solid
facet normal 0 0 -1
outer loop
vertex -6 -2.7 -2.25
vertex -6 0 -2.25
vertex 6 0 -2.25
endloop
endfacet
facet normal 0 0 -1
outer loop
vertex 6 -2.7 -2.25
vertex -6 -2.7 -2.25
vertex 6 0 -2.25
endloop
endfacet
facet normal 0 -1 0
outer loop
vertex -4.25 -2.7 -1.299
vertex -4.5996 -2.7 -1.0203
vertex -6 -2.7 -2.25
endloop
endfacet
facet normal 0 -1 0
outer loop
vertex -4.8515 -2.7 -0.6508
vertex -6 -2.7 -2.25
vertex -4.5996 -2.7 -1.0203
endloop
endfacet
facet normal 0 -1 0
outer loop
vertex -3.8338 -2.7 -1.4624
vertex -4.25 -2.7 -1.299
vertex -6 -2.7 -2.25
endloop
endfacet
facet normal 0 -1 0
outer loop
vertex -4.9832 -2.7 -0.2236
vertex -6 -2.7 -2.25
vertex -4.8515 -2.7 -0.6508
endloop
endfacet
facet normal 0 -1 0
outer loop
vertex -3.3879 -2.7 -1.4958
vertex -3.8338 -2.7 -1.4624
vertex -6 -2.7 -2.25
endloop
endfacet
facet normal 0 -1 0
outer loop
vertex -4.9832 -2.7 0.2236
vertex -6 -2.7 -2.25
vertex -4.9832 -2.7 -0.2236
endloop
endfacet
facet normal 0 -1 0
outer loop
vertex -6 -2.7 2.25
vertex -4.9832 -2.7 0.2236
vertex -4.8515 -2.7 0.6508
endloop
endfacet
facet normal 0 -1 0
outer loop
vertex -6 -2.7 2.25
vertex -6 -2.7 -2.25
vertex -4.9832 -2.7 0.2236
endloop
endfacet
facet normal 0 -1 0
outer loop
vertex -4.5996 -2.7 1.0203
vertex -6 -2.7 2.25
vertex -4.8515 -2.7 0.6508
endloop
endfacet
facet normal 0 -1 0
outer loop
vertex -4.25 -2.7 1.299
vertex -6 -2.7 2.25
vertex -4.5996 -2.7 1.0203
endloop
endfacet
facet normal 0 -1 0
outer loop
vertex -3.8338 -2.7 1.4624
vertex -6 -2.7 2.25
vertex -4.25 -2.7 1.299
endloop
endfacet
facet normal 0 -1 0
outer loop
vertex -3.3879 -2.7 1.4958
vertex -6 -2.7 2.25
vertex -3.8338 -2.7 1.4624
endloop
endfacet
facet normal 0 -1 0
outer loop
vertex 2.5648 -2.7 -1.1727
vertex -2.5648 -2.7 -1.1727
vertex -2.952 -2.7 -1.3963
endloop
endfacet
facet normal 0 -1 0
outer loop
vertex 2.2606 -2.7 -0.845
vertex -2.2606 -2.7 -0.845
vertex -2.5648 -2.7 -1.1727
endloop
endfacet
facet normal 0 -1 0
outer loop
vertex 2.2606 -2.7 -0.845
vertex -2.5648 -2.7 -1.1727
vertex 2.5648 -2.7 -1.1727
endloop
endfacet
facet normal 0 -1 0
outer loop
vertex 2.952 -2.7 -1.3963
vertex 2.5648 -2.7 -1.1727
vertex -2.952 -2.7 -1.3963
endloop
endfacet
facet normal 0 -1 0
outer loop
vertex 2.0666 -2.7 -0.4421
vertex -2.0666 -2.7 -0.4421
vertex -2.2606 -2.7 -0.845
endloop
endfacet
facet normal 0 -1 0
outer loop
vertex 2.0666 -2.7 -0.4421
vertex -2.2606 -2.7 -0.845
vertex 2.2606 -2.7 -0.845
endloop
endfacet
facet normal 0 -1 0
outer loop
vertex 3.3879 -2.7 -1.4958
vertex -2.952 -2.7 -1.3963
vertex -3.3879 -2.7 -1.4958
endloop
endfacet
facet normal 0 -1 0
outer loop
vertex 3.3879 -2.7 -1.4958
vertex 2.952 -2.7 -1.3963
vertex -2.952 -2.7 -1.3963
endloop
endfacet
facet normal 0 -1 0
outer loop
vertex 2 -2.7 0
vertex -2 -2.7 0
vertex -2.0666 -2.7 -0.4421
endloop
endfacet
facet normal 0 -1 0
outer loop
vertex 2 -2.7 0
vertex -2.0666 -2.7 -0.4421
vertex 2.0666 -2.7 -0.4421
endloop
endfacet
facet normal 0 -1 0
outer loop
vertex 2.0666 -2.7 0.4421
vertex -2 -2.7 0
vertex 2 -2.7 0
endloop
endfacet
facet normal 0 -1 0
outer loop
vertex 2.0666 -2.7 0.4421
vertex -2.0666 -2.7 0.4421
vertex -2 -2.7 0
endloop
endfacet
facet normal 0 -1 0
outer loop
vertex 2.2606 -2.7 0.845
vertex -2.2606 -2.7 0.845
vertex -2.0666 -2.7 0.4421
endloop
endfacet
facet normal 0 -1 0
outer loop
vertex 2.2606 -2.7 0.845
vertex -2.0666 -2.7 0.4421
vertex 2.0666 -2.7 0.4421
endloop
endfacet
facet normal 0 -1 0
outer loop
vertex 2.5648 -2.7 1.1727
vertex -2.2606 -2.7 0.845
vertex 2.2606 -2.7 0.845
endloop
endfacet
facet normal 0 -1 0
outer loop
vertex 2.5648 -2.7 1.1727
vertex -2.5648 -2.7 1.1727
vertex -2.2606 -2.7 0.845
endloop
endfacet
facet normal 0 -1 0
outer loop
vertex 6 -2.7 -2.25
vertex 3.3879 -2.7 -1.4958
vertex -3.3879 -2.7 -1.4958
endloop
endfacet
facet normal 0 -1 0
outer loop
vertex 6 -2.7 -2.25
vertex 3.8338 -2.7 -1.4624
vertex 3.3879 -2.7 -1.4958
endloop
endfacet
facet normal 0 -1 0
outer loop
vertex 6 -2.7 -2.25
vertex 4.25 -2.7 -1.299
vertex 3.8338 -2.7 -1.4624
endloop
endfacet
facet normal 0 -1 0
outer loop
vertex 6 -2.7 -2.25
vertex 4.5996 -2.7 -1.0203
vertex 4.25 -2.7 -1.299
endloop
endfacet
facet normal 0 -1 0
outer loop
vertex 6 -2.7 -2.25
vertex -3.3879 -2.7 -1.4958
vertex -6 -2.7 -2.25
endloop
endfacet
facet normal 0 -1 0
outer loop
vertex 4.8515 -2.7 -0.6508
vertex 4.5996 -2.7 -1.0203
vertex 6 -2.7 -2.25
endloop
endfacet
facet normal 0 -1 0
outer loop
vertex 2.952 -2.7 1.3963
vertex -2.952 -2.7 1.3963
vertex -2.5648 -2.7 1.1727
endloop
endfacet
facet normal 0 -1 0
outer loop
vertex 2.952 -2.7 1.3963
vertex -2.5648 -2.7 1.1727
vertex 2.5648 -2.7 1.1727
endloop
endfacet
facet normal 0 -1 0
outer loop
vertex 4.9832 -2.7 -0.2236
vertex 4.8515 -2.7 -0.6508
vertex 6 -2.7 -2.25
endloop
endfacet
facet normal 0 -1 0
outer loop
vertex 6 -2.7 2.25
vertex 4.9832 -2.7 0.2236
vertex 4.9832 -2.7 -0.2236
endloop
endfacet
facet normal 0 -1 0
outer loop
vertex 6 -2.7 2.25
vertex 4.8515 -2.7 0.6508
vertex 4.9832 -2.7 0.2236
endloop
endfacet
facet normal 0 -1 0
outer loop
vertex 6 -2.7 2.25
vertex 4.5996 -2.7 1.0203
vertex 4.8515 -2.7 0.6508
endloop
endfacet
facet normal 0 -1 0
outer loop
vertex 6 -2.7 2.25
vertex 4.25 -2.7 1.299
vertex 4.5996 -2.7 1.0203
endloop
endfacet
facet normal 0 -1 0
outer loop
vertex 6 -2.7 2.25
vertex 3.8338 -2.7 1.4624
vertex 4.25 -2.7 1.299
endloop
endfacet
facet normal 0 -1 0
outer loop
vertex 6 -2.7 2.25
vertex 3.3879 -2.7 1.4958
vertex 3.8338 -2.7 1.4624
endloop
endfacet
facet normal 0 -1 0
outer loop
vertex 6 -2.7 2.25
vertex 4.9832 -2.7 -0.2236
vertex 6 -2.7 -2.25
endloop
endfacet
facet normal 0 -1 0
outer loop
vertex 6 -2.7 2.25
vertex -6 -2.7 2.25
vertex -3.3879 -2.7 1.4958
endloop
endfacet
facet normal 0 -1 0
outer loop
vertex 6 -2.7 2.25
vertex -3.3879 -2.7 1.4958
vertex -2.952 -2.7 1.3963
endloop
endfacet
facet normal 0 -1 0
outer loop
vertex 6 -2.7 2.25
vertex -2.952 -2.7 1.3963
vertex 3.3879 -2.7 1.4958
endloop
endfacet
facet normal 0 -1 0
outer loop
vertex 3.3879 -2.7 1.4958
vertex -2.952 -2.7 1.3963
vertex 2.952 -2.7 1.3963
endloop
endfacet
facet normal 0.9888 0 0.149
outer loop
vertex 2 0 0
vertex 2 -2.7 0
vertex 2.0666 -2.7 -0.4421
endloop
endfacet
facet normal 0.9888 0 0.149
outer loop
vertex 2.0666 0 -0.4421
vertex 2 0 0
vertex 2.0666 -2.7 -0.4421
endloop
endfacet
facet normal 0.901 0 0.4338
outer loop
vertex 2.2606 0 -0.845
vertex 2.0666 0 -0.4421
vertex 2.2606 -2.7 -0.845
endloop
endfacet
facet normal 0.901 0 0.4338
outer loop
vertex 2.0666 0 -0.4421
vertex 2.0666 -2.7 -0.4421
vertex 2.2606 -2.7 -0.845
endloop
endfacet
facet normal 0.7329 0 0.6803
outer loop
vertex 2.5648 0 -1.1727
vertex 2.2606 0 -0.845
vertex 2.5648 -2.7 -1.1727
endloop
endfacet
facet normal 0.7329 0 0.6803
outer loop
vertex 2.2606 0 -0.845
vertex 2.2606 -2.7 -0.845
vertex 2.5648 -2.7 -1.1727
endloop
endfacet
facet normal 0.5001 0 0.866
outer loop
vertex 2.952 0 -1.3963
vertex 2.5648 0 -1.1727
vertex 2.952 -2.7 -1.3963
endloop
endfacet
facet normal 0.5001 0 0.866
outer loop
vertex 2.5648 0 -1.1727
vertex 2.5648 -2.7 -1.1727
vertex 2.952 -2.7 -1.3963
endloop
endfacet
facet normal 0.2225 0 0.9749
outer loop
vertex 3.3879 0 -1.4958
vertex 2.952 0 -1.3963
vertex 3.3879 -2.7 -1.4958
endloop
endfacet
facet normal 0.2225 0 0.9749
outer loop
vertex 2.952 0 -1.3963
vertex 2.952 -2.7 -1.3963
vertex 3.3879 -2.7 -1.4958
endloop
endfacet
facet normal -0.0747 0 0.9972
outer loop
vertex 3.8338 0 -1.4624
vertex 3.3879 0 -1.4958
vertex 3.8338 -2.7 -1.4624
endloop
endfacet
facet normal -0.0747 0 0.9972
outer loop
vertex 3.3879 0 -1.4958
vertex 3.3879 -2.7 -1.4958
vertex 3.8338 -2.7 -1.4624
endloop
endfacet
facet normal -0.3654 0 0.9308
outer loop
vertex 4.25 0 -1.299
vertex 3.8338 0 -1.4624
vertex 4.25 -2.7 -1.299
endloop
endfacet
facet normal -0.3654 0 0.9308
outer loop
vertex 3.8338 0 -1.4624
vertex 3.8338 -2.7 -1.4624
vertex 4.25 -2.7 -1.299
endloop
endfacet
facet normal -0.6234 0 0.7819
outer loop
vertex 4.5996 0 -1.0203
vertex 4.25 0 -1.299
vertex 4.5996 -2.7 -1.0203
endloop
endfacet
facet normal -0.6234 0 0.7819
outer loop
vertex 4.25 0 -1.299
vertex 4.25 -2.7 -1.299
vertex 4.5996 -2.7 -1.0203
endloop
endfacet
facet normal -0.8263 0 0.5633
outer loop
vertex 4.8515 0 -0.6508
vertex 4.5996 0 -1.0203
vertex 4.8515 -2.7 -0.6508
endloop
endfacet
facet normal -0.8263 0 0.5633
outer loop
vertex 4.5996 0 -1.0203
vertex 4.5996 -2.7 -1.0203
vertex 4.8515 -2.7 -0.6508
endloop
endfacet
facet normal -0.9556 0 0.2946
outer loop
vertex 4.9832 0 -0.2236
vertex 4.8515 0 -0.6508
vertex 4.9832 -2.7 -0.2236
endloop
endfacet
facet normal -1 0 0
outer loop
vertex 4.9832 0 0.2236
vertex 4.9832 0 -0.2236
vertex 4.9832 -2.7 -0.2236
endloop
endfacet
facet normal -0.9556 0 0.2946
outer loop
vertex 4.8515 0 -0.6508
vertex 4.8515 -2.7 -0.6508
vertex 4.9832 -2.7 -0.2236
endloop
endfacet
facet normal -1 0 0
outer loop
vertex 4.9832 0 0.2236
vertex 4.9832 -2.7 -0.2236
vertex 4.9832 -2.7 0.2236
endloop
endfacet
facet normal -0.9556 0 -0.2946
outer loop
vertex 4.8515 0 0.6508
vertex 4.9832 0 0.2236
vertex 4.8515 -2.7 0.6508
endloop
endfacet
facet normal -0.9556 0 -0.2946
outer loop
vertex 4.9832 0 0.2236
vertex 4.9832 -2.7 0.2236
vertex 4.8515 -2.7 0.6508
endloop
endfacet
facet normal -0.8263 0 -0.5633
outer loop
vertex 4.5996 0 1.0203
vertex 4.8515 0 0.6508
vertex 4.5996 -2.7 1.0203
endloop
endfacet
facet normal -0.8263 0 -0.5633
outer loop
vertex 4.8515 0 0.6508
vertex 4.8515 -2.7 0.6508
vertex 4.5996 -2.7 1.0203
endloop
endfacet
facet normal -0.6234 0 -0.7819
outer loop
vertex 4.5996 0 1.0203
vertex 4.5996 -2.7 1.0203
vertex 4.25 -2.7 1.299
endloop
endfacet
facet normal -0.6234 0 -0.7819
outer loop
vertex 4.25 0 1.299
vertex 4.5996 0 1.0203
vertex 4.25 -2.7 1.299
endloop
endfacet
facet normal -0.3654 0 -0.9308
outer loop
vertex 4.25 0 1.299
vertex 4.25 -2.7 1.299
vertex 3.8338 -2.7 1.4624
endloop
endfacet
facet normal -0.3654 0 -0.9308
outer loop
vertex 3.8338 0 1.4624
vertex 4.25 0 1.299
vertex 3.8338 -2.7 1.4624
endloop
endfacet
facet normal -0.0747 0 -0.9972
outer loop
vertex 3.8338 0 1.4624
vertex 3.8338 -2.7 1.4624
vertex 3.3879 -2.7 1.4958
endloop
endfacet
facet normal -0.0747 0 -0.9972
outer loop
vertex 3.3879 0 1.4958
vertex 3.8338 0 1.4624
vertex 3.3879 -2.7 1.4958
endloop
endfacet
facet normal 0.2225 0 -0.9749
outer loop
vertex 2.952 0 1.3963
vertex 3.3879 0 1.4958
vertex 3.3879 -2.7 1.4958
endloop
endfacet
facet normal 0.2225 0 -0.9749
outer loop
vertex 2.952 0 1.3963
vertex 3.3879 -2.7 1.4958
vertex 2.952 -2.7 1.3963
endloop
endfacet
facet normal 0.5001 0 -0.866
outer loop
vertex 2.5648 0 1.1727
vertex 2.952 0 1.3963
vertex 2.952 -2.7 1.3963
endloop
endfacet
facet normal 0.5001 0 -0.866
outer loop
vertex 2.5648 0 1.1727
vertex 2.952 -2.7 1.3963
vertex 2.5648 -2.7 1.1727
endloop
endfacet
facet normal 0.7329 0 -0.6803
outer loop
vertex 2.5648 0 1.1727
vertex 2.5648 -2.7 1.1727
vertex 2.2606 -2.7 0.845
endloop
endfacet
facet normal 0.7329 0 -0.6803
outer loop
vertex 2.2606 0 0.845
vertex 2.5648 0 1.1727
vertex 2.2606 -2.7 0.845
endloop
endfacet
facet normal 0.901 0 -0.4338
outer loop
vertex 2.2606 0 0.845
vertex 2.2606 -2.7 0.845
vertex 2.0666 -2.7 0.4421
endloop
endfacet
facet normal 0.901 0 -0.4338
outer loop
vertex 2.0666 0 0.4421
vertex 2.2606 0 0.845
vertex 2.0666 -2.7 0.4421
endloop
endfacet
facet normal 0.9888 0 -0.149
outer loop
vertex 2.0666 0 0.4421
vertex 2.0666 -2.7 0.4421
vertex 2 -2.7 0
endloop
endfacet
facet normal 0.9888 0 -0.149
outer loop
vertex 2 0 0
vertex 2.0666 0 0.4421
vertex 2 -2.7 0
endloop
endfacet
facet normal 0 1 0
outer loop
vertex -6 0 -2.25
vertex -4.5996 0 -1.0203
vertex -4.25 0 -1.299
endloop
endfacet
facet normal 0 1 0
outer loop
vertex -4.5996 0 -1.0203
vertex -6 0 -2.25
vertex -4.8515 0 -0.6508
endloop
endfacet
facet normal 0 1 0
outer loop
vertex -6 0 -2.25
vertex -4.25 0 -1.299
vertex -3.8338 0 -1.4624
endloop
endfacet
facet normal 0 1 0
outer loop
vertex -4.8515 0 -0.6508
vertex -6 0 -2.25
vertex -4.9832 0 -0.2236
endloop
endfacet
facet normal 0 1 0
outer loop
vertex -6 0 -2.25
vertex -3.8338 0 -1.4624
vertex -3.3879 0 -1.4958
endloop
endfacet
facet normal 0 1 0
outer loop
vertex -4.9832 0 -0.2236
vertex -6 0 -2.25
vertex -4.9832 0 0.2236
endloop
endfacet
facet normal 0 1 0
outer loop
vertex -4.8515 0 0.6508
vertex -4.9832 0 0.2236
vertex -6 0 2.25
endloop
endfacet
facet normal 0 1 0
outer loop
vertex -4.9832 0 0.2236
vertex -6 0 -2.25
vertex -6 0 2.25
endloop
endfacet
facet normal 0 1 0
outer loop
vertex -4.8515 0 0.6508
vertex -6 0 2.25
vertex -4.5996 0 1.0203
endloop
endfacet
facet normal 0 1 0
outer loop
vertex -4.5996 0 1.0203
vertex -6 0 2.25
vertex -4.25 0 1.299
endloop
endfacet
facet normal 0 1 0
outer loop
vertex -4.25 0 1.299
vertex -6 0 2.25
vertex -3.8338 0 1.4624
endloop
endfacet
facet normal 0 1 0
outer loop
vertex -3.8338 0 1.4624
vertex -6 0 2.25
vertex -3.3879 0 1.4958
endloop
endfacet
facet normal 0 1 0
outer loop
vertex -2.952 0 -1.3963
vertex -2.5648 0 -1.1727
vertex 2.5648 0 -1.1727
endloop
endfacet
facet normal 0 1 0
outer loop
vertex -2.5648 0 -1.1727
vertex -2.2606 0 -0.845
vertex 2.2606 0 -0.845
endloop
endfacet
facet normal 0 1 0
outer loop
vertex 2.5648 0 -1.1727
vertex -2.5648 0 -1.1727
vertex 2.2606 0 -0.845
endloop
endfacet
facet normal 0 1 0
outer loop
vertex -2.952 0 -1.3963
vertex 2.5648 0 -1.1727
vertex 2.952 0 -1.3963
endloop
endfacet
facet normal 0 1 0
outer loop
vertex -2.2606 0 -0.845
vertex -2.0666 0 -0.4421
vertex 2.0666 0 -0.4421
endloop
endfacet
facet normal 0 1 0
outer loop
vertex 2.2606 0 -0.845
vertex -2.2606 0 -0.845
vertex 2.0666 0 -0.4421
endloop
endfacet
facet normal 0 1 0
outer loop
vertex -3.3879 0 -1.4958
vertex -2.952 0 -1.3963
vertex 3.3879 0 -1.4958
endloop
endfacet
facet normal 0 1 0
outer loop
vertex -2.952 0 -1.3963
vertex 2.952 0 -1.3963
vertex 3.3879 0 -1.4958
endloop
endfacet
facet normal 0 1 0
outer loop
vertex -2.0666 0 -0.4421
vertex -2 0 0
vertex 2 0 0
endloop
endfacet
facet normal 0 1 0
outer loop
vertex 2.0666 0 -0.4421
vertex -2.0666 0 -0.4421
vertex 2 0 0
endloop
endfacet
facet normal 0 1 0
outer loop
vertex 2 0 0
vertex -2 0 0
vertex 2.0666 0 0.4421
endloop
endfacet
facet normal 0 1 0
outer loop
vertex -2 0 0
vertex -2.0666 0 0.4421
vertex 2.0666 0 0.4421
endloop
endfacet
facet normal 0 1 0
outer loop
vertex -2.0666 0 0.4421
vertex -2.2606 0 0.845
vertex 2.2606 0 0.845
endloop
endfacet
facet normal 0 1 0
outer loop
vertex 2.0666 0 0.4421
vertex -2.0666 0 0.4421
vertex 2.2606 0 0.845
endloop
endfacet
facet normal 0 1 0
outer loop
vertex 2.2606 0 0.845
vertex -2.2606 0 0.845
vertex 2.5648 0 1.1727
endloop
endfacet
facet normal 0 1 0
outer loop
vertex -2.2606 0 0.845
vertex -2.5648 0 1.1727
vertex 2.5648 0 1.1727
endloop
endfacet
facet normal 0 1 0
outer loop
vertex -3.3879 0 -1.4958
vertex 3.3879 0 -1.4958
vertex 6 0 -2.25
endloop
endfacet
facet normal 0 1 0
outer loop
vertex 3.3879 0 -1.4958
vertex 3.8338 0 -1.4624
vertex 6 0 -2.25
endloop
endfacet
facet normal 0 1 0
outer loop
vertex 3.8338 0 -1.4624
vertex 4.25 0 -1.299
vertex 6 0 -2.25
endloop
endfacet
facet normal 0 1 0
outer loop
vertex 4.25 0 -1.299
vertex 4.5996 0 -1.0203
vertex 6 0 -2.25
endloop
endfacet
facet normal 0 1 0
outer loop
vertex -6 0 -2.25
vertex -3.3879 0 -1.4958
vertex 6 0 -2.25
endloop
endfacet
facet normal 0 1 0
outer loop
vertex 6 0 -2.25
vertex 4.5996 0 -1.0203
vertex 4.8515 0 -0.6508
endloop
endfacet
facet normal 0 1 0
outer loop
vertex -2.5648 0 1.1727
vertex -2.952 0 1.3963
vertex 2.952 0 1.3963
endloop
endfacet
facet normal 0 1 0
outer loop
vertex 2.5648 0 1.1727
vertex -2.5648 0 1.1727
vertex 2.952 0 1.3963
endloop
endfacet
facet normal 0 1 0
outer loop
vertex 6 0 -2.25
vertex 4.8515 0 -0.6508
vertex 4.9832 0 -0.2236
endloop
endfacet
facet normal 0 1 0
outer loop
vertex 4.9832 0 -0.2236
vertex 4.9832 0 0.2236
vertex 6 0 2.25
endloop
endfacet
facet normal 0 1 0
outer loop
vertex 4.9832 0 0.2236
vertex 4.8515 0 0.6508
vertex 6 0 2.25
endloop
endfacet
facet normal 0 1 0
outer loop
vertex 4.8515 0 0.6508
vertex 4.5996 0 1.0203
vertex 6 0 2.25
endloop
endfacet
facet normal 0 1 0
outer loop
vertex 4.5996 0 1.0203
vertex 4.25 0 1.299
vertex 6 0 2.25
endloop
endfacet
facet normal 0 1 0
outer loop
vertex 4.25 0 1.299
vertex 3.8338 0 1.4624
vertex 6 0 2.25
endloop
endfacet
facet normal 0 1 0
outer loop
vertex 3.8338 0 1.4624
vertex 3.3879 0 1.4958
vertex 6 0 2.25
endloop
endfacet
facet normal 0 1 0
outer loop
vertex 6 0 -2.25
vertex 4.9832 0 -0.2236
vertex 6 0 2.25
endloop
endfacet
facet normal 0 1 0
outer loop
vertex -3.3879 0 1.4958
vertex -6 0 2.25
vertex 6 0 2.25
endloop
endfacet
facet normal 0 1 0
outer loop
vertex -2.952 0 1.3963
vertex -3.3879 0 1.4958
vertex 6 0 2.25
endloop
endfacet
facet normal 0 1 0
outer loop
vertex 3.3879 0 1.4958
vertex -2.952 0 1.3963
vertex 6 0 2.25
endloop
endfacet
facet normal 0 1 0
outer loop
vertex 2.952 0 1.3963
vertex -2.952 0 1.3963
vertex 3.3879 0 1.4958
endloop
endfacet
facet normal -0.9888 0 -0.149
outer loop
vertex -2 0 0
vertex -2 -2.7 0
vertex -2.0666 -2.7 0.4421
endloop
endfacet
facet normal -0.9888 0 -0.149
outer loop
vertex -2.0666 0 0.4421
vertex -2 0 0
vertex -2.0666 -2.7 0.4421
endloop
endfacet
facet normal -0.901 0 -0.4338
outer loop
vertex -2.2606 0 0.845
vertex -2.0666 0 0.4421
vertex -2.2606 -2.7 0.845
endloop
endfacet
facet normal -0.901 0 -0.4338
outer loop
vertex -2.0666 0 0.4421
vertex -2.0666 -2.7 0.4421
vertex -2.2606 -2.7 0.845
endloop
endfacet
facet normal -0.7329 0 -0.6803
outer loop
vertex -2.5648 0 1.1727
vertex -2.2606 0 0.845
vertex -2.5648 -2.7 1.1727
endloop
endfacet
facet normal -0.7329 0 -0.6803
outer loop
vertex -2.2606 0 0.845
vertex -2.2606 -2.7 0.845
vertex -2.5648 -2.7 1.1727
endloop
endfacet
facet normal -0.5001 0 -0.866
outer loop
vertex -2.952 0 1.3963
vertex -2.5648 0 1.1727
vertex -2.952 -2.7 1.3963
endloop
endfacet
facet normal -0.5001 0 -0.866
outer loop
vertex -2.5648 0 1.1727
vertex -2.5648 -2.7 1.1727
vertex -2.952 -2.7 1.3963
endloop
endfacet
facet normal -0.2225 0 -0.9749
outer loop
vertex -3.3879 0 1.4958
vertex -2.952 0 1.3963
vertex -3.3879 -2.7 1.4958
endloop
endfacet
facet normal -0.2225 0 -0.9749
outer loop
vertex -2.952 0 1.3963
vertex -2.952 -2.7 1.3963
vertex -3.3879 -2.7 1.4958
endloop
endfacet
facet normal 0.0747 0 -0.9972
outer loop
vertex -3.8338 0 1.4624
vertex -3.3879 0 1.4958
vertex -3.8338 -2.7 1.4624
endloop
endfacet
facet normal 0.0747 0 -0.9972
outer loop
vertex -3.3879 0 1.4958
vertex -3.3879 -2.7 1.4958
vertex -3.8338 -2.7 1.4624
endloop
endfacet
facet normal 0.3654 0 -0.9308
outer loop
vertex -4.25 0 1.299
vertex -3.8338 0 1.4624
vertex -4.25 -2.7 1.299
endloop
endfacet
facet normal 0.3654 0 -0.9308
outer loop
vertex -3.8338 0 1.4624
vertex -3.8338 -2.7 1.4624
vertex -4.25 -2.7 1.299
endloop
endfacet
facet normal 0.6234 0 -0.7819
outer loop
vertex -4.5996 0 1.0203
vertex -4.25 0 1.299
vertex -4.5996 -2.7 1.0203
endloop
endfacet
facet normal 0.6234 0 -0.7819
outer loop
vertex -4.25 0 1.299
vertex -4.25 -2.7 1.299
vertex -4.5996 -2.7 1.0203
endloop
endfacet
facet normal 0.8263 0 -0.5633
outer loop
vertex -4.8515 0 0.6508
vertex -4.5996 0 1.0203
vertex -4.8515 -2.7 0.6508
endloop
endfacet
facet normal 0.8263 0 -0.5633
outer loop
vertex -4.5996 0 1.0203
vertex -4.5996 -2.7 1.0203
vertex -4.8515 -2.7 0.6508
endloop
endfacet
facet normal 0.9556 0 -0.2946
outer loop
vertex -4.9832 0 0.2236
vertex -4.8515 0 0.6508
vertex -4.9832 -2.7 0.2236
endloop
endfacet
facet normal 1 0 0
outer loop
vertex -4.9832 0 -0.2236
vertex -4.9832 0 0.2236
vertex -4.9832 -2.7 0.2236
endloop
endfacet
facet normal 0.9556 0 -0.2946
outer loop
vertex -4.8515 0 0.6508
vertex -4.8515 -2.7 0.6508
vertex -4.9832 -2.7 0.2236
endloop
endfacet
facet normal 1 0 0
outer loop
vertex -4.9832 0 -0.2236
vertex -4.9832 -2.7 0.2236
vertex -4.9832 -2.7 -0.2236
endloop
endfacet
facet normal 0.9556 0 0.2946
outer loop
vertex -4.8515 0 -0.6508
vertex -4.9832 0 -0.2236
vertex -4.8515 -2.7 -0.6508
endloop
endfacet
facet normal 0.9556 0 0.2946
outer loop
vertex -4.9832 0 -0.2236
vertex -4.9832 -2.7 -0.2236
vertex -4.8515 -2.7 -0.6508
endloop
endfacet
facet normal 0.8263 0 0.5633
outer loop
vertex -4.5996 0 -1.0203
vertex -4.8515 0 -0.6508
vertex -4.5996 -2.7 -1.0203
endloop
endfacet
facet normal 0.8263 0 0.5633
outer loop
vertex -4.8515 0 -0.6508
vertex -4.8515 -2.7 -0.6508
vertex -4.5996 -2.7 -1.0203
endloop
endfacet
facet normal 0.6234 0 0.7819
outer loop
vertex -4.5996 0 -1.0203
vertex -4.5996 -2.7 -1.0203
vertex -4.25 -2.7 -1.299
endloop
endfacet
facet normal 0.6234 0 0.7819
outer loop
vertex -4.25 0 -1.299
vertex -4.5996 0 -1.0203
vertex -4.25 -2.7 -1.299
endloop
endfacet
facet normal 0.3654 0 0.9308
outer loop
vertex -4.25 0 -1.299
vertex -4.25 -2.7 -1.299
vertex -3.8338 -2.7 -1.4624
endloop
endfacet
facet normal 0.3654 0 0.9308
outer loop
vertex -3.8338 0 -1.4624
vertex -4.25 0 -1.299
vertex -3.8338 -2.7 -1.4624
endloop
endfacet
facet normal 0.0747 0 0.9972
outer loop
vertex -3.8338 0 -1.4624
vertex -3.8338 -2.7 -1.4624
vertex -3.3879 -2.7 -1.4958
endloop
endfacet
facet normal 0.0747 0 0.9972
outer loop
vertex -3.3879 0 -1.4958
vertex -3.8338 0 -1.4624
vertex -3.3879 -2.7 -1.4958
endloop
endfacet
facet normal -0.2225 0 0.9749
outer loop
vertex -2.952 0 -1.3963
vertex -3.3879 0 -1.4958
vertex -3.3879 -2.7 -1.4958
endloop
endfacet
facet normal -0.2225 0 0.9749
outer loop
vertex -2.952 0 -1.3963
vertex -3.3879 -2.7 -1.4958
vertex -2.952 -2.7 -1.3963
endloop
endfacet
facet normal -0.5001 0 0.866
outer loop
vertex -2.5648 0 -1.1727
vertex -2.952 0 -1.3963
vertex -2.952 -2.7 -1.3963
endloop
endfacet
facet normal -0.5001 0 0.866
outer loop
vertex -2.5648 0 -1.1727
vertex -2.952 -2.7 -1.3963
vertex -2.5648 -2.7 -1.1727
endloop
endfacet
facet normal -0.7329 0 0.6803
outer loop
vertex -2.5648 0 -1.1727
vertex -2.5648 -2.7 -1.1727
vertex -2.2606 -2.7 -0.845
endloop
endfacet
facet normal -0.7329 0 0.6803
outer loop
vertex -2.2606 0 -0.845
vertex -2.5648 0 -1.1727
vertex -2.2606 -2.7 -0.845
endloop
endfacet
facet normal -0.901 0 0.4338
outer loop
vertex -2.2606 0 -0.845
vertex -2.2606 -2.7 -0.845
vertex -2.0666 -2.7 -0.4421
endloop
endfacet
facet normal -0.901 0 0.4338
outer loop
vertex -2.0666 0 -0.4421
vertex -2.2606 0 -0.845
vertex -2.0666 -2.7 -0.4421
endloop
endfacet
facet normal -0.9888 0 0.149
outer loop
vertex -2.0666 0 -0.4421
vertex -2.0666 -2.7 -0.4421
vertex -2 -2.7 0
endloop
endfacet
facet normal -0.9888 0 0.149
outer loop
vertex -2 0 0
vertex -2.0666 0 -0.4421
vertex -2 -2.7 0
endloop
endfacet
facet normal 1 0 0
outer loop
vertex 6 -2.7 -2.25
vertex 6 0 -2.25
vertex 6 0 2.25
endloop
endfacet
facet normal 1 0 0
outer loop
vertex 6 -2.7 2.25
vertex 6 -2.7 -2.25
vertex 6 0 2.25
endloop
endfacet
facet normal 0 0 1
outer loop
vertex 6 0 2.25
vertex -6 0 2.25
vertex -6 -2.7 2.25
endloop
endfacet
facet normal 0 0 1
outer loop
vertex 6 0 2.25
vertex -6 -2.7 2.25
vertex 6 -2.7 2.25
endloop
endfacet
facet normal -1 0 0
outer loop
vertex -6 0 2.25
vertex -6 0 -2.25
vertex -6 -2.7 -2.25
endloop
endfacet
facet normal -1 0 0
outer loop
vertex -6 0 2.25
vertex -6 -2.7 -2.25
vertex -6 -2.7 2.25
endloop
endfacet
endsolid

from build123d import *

# Parameters (mm, degrees)
F0_W     = 12
F0_H     = 4.5
F1_DEPTH = 2.7
F2_R     = 1.5
F3_DEPTH = 25


with BuildPart() as f1:
    # F0 (on Front) → F1 (new body)
    with BuildSketch(Plane.XZ):
        Rectangle(F0_W, F0_H)
    extrude(amount=F1_DEPTH)

    # F2 (on face) → F3 (cut)
    with BuildSketch(Plane.XZ.offset(2.7)):
        with Locations((-3.5, 0)):
            Circle(F2_R)
        with BuildLine():
            ThreePointArc((5, 0), (3.5, 1.5), (2, 0))
            ThreePointArc((2, 0), (3.5, -1.5), (5, 0))
        make_face()
    extrude(amount=-F3_DEPTH, mode=Mode.SUBTRACT)


solid = f1.part
